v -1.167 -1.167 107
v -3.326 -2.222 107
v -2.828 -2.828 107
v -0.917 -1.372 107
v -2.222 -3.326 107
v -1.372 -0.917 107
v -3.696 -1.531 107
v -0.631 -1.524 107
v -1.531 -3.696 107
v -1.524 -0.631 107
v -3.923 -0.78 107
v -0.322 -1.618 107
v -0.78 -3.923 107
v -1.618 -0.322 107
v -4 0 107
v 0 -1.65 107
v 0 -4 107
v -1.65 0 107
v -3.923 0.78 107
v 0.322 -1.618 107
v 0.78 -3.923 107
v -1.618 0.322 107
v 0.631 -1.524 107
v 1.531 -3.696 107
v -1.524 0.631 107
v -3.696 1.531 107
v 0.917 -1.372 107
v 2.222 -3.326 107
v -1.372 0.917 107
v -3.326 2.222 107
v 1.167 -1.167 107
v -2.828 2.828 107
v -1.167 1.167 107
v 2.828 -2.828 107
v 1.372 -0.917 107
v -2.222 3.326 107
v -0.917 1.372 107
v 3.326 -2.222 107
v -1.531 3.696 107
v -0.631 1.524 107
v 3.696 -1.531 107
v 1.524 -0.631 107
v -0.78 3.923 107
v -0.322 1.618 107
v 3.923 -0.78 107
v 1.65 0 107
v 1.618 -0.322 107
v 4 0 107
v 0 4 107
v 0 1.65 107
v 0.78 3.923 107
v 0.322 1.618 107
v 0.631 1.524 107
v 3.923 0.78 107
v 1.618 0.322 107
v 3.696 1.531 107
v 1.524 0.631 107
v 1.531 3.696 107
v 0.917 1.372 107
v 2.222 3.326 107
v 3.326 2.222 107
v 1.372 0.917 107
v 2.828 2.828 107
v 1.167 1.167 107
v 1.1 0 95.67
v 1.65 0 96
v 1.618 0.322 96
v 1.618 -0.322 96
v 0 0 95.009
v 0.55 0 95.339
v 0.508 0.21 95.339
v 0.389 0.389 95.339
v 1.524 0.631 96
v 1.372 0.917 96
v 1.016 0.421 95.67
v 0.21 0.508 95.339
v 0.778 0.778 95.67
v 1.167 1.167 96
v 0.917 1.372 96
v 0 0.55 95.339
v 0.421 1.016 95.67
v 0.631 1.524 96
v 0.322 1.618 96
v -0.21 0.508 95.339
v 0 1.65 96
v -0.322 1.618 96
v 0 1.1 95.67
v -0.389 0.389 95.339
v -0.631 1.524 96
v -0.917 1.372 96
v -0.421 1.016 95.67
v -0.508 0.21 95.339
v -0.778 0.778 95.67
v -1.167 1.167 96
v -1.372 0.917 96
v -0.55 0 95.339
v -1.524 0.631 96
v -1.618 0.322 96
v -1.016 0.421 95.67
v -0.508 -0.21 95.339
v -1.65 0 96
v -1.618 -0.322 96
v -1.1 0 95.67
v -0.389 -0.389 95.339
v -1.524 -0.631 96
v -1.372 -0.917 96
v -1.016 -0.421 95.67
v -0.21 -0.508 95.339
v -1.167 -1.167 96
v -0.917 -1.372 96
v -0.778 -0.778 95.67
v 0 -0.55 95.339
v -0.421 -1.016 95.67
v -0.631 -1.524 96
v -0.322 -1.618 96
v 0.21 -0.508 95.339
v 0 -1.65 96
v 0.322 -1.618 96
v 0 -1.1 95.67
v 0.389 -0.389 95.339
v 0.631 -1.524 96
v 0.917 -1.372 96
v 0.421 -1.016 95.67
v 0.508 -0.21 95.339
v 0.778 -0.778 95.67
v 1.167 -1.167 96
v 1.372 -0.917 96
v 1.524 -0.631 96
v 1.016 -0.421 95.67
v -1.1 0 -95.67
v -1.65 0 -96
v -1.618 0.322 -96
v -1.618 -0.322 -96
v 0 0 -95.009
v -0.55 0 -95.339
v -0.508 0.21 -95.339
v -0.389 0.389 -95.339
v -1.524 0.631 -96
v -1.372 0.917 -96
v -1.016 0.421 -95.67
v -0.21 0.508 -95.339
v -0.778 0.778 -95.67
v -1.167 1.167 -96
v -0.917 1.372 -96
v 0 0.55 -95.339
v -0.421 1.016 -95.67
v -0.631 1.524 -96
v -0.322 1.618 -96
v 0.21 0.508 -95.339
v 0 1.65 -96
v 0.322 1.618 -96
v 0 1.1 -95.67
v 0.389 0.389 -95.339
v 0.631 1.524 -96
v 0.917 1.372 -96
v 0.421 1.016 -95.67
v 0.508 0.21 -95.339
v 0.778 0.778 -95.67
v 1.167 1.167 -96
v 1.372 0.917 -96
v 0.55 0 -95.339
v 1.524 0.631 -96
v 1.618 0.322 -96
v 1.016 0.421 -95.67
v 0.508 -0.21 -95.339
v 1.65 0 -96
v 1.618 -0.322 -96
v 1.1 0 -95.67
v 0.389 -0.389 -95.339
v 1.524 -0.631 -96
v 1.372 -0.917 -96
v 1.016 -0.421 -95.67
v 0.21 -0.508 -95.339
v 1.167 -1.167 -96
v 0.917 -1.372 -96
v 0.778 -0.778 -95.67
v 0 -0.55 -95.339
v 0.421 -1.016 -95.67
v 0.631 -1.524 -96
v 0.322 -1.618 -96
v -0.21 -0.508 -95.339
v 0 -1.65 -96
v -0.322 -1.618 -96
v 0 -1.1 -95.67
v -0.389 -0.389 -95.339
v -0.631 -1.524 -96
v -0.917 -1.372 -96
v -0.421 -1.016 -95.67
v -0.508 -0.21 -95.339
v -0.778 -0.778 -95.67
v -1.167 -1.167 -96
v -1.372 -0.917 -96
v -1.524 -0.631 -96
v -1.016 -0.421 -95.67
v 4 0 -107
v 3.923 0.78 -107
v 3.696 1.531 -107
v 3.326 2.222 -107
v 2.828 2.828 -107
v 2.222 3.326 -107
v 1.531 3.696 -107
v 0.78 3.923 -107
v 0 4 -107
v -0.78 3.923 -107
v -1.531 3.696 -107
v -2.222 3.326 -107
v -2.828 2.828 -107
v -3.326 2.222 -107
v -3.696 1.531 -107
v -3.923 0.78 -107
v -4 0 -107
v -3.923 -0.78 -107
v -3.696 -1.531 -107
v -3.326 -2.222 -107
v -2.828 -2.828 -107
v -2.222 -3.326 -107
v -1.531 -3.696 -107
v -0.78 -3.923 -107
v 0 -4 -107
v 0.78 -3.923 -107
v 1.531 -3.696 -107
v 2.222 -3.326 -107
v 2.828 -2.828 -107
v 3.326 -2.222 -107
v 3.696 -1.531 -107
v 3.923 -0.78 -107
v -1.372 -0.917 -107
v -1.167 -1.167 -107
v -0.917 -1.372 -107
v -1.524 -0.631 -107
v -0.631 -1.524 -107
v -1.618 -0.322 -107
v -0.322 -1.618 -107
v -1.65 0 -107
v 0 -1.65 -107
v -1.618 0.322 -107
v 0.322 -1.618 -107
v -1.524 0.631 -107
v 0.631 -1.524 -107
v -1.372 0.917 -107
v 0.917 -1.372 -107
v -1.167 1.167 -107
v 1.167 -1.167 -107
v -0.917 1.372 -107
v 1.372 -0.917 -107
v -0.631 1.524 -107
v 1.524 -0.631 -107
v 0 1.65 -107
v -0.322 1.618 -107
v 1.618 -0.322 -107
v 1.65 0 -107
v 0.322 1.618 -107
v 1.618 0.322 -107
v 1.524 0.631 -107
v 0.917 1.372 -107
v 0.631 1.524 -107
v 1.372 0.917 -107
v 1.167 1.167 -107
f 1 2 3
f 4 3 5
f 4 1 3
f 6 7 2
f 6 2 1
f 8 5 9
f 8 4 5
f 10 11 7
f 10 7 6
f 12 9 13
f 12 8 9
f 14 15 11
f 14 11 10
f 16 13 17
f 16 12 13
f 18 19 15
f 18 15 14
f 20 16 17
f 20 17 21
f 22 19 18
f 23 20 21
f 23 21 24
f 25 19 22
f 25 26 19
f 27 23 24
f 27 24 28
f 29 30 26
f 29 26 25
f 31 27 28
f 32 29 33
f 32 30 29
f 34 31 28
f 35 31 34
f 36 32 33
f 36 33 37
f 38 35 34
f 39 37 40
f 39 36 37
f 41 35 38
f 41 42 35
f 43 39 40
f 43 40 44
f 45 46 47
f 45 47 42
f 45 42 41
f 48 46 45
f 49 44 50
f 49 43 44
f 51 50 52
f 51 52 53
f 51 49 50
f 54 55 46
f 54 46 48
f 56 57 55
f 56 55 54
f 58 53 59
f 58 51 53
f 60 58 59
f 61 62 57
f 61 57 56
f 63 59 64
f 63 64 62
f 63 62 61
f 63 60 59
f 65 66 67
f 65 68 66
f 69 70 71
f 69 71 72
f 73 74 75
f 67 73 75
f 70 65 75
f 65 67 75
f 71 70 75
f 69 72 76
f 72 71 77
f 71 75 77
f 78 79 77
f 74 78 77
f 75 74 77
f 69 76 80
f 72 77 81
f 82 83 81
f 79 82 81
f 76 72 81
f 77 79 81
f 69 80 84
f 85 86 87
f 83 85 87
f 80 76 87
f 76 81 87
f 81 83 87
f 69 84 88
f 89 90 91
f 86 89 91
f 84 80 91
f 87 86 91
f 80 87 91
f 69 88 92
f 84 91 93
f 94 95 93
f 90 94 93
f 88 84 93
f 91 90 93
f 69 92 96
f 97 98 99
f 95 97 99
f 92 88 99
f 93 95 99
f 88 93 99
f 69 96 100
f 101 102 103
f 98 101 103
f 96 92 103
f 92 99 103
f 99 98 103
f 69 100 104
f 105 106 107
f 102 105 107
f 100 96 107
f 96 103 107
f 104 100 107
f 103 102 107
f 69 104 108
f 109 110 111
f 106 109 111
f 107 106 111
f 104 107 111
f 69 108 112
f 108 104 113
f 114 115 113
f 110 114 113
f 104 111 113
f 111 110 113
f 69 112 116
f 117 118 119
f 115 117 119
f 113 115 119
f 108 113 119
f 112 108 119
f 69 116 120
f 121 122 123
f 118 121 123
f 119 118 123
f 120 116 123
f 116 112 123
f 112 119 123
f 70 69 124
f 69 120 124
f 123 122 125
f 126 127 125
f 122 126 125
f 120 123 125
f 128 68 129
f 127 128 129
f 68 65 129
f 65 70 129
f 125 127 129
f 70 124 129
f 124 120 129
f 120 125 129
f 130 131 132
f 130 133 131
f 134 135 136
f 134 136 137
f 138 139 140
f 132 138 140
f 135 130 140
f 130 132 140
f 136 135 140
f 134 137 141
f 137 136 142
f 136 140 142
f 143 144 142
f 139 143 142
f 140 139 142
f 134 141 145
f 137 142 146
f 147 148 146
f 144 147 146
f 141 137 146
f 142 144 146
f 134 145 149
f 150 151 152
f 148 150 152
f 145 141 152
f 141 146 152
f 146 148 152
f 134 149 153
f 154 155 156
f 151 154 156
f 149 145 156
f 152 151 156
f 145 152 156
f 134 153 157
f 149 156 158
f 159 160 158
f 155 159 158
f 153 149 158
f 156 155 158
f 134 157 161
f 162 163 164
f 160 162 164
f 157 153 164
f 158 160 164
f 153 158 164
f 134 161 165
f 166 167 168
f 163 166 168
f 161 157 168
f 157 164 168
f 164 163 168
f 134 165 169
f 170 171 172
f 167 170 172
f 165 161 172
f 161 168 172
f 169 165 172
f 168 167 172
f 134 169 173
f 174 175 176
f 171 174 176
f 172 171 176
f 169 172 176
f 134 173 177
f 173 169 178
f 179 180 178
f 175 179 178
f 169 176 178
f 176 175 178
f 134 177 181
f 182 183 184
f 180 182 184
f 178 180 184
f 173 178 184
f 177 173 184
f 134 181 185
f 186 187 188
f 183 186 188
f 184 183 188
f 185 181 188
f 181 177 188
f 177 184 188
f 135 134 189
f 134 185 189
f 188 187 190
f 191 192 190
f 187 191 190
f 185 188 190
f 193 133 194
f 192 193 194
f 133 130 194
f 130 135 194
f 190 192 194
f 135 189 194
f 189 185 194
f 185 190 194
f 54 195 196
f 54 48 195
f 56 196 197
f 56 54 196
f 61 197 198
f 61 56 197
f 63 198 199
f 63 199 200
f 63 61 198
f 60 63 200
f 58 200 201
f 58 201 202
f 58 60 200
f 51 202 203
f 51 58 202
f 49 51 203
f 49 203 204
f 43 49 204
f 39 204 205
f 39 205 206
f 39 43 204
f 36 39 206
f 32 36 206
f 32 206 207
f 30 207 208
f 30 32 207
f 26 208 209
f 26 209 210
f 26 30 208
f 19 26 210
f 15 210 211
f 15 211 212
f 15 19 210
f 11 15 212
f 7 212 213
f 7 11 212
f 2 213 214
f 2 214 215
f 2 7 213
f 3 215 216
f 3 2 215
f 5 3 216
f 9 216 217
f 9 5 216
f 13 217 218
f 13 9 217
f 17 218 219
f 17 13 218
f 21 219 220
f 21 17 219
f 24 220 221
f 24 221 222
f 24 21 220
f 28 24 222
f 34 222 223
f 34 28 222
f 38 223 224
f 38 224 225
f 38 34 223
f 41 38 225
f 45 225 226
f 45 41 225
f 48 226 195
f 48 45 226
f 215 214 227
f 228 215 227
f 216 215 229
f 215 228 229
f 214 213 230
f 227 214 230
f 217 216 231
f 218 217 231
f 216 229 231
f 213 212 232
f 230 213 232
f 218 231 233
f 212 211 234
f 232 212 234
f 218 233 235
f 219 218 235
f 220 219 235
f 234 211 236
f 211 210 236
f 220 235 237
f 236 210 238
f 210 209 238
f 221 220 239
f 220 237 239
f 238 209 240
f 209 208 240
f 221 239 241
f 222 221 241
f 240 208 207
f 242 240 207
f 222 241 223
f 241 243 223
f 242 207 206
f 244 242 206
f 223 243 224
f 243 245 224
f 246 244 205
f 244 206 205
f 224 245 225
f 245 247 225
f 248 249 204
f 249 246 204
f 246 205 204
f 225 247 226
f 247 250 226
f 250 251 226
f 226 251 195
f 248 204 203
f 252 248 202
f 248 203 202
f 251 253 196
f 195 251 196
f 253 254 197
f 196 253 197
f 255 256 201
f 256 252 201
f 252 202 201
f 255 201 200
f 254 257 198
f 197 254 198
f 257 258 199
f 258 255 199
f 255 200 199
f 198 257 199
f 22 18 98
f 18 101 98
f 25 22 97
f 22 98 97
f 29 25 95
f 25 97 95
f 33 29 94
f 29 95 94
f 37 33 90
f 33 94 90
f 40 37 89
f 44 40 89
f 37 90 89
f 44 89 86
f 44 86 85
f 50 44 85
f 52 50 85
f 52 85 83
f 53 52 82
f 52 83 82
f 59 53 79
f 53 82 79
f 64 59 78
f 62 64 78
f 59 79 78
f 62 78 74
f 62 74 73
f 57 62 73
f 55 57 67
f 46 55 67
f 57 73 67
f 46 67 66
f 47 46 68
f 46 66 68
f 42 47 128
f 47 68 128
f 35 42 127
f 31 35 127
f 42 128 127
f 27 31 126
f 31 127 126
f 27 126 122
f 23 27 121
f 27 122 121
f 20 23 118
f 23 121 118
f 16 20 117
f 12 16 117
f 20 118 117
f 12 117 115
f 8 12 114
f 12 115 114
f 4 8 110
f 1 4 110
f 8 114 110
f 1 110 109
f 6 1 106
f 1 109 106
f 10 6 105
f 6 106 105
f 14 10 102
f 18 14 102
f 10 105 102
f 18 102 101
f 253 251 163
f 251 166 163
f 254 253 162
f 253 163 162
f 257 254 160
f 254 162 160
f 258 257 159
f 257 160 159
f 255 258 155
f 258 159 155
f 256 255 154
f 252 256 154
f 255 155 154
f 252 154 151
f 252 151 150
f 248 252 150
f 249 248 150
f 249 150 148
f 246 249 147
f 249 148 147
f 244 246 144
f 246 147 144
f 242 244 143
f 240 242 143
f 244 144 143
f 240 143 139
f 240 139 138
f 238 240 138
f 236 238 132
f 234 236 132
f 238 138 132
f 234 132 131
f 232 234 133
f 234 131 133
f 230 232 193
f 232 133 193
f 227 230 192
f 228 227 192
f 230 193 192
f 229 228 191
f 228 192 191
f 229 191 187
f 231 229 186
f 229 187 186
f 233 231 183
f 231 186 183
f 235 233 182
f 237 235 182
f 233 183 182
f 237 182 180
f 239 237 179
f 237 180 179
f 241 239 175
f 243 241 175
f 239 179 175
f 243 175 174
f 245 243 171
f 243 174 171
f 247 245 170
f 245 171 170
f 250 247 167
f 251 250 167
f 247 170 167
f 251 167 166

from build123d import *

# Parameters (mm, degrees)
SKETCH_1_R      = 4
EXTRUDE_1_DEPTH = 107
M4X0_71_D       = 3.3
M4X0_71_DEPTH   = 11
M4X0_71_TIP     = 0.991420021
M4X0_72_D       = 3.3
M4X0_72_DEPTH   = 11
M4X0_72_TIP     = 0.991420021


with BuildPart() as part:
    # Эскиз1 → Бобышка-Вытянуть1 (new, symmetric)
    with BuildSketch(Plane.XY):
        Circle(SKETCH_1_R)
    extrude(amount=EXTRUDE_1_DEPTH, both=True)

    # Отверстие обработанное метчиком M4x0.71
    with Locations(Plane(origin=(0, 0, -107), x_dir=(-1, 0, 0), z_dir=(0, 0, -1))):
        with Locations((0, 0)):
            Hole(M4X0_71_D / 2, depth=M4X0_71_DEPTH)
            with Locations((0, 0, -(M4X0_71_DEPTH + M4X0_71_TIP / 2))):  # 118° drill point
                Cone(0, M4X0_71_D / 2, M4X0_71_TIP, mode=Mode.SUBTRACT)

    # Отверстие обработанное метчиком M4x0.72
    with Locations(Plane.XY.offset(107)):
        with Locations((0, 0)):
            Hole(M4X0_72_D / 2, depth=M4X0_72_DEPTH)
            with Locations((0, 0, -(M4X0_72_DEPTH + M4X0_72_TIP / 2))):  # 118° drill point
                Cone(0, M4X0_72_D / 2, M4X0_72_TIP, mode=Mode.SUBTRACT)


solid = part.part
